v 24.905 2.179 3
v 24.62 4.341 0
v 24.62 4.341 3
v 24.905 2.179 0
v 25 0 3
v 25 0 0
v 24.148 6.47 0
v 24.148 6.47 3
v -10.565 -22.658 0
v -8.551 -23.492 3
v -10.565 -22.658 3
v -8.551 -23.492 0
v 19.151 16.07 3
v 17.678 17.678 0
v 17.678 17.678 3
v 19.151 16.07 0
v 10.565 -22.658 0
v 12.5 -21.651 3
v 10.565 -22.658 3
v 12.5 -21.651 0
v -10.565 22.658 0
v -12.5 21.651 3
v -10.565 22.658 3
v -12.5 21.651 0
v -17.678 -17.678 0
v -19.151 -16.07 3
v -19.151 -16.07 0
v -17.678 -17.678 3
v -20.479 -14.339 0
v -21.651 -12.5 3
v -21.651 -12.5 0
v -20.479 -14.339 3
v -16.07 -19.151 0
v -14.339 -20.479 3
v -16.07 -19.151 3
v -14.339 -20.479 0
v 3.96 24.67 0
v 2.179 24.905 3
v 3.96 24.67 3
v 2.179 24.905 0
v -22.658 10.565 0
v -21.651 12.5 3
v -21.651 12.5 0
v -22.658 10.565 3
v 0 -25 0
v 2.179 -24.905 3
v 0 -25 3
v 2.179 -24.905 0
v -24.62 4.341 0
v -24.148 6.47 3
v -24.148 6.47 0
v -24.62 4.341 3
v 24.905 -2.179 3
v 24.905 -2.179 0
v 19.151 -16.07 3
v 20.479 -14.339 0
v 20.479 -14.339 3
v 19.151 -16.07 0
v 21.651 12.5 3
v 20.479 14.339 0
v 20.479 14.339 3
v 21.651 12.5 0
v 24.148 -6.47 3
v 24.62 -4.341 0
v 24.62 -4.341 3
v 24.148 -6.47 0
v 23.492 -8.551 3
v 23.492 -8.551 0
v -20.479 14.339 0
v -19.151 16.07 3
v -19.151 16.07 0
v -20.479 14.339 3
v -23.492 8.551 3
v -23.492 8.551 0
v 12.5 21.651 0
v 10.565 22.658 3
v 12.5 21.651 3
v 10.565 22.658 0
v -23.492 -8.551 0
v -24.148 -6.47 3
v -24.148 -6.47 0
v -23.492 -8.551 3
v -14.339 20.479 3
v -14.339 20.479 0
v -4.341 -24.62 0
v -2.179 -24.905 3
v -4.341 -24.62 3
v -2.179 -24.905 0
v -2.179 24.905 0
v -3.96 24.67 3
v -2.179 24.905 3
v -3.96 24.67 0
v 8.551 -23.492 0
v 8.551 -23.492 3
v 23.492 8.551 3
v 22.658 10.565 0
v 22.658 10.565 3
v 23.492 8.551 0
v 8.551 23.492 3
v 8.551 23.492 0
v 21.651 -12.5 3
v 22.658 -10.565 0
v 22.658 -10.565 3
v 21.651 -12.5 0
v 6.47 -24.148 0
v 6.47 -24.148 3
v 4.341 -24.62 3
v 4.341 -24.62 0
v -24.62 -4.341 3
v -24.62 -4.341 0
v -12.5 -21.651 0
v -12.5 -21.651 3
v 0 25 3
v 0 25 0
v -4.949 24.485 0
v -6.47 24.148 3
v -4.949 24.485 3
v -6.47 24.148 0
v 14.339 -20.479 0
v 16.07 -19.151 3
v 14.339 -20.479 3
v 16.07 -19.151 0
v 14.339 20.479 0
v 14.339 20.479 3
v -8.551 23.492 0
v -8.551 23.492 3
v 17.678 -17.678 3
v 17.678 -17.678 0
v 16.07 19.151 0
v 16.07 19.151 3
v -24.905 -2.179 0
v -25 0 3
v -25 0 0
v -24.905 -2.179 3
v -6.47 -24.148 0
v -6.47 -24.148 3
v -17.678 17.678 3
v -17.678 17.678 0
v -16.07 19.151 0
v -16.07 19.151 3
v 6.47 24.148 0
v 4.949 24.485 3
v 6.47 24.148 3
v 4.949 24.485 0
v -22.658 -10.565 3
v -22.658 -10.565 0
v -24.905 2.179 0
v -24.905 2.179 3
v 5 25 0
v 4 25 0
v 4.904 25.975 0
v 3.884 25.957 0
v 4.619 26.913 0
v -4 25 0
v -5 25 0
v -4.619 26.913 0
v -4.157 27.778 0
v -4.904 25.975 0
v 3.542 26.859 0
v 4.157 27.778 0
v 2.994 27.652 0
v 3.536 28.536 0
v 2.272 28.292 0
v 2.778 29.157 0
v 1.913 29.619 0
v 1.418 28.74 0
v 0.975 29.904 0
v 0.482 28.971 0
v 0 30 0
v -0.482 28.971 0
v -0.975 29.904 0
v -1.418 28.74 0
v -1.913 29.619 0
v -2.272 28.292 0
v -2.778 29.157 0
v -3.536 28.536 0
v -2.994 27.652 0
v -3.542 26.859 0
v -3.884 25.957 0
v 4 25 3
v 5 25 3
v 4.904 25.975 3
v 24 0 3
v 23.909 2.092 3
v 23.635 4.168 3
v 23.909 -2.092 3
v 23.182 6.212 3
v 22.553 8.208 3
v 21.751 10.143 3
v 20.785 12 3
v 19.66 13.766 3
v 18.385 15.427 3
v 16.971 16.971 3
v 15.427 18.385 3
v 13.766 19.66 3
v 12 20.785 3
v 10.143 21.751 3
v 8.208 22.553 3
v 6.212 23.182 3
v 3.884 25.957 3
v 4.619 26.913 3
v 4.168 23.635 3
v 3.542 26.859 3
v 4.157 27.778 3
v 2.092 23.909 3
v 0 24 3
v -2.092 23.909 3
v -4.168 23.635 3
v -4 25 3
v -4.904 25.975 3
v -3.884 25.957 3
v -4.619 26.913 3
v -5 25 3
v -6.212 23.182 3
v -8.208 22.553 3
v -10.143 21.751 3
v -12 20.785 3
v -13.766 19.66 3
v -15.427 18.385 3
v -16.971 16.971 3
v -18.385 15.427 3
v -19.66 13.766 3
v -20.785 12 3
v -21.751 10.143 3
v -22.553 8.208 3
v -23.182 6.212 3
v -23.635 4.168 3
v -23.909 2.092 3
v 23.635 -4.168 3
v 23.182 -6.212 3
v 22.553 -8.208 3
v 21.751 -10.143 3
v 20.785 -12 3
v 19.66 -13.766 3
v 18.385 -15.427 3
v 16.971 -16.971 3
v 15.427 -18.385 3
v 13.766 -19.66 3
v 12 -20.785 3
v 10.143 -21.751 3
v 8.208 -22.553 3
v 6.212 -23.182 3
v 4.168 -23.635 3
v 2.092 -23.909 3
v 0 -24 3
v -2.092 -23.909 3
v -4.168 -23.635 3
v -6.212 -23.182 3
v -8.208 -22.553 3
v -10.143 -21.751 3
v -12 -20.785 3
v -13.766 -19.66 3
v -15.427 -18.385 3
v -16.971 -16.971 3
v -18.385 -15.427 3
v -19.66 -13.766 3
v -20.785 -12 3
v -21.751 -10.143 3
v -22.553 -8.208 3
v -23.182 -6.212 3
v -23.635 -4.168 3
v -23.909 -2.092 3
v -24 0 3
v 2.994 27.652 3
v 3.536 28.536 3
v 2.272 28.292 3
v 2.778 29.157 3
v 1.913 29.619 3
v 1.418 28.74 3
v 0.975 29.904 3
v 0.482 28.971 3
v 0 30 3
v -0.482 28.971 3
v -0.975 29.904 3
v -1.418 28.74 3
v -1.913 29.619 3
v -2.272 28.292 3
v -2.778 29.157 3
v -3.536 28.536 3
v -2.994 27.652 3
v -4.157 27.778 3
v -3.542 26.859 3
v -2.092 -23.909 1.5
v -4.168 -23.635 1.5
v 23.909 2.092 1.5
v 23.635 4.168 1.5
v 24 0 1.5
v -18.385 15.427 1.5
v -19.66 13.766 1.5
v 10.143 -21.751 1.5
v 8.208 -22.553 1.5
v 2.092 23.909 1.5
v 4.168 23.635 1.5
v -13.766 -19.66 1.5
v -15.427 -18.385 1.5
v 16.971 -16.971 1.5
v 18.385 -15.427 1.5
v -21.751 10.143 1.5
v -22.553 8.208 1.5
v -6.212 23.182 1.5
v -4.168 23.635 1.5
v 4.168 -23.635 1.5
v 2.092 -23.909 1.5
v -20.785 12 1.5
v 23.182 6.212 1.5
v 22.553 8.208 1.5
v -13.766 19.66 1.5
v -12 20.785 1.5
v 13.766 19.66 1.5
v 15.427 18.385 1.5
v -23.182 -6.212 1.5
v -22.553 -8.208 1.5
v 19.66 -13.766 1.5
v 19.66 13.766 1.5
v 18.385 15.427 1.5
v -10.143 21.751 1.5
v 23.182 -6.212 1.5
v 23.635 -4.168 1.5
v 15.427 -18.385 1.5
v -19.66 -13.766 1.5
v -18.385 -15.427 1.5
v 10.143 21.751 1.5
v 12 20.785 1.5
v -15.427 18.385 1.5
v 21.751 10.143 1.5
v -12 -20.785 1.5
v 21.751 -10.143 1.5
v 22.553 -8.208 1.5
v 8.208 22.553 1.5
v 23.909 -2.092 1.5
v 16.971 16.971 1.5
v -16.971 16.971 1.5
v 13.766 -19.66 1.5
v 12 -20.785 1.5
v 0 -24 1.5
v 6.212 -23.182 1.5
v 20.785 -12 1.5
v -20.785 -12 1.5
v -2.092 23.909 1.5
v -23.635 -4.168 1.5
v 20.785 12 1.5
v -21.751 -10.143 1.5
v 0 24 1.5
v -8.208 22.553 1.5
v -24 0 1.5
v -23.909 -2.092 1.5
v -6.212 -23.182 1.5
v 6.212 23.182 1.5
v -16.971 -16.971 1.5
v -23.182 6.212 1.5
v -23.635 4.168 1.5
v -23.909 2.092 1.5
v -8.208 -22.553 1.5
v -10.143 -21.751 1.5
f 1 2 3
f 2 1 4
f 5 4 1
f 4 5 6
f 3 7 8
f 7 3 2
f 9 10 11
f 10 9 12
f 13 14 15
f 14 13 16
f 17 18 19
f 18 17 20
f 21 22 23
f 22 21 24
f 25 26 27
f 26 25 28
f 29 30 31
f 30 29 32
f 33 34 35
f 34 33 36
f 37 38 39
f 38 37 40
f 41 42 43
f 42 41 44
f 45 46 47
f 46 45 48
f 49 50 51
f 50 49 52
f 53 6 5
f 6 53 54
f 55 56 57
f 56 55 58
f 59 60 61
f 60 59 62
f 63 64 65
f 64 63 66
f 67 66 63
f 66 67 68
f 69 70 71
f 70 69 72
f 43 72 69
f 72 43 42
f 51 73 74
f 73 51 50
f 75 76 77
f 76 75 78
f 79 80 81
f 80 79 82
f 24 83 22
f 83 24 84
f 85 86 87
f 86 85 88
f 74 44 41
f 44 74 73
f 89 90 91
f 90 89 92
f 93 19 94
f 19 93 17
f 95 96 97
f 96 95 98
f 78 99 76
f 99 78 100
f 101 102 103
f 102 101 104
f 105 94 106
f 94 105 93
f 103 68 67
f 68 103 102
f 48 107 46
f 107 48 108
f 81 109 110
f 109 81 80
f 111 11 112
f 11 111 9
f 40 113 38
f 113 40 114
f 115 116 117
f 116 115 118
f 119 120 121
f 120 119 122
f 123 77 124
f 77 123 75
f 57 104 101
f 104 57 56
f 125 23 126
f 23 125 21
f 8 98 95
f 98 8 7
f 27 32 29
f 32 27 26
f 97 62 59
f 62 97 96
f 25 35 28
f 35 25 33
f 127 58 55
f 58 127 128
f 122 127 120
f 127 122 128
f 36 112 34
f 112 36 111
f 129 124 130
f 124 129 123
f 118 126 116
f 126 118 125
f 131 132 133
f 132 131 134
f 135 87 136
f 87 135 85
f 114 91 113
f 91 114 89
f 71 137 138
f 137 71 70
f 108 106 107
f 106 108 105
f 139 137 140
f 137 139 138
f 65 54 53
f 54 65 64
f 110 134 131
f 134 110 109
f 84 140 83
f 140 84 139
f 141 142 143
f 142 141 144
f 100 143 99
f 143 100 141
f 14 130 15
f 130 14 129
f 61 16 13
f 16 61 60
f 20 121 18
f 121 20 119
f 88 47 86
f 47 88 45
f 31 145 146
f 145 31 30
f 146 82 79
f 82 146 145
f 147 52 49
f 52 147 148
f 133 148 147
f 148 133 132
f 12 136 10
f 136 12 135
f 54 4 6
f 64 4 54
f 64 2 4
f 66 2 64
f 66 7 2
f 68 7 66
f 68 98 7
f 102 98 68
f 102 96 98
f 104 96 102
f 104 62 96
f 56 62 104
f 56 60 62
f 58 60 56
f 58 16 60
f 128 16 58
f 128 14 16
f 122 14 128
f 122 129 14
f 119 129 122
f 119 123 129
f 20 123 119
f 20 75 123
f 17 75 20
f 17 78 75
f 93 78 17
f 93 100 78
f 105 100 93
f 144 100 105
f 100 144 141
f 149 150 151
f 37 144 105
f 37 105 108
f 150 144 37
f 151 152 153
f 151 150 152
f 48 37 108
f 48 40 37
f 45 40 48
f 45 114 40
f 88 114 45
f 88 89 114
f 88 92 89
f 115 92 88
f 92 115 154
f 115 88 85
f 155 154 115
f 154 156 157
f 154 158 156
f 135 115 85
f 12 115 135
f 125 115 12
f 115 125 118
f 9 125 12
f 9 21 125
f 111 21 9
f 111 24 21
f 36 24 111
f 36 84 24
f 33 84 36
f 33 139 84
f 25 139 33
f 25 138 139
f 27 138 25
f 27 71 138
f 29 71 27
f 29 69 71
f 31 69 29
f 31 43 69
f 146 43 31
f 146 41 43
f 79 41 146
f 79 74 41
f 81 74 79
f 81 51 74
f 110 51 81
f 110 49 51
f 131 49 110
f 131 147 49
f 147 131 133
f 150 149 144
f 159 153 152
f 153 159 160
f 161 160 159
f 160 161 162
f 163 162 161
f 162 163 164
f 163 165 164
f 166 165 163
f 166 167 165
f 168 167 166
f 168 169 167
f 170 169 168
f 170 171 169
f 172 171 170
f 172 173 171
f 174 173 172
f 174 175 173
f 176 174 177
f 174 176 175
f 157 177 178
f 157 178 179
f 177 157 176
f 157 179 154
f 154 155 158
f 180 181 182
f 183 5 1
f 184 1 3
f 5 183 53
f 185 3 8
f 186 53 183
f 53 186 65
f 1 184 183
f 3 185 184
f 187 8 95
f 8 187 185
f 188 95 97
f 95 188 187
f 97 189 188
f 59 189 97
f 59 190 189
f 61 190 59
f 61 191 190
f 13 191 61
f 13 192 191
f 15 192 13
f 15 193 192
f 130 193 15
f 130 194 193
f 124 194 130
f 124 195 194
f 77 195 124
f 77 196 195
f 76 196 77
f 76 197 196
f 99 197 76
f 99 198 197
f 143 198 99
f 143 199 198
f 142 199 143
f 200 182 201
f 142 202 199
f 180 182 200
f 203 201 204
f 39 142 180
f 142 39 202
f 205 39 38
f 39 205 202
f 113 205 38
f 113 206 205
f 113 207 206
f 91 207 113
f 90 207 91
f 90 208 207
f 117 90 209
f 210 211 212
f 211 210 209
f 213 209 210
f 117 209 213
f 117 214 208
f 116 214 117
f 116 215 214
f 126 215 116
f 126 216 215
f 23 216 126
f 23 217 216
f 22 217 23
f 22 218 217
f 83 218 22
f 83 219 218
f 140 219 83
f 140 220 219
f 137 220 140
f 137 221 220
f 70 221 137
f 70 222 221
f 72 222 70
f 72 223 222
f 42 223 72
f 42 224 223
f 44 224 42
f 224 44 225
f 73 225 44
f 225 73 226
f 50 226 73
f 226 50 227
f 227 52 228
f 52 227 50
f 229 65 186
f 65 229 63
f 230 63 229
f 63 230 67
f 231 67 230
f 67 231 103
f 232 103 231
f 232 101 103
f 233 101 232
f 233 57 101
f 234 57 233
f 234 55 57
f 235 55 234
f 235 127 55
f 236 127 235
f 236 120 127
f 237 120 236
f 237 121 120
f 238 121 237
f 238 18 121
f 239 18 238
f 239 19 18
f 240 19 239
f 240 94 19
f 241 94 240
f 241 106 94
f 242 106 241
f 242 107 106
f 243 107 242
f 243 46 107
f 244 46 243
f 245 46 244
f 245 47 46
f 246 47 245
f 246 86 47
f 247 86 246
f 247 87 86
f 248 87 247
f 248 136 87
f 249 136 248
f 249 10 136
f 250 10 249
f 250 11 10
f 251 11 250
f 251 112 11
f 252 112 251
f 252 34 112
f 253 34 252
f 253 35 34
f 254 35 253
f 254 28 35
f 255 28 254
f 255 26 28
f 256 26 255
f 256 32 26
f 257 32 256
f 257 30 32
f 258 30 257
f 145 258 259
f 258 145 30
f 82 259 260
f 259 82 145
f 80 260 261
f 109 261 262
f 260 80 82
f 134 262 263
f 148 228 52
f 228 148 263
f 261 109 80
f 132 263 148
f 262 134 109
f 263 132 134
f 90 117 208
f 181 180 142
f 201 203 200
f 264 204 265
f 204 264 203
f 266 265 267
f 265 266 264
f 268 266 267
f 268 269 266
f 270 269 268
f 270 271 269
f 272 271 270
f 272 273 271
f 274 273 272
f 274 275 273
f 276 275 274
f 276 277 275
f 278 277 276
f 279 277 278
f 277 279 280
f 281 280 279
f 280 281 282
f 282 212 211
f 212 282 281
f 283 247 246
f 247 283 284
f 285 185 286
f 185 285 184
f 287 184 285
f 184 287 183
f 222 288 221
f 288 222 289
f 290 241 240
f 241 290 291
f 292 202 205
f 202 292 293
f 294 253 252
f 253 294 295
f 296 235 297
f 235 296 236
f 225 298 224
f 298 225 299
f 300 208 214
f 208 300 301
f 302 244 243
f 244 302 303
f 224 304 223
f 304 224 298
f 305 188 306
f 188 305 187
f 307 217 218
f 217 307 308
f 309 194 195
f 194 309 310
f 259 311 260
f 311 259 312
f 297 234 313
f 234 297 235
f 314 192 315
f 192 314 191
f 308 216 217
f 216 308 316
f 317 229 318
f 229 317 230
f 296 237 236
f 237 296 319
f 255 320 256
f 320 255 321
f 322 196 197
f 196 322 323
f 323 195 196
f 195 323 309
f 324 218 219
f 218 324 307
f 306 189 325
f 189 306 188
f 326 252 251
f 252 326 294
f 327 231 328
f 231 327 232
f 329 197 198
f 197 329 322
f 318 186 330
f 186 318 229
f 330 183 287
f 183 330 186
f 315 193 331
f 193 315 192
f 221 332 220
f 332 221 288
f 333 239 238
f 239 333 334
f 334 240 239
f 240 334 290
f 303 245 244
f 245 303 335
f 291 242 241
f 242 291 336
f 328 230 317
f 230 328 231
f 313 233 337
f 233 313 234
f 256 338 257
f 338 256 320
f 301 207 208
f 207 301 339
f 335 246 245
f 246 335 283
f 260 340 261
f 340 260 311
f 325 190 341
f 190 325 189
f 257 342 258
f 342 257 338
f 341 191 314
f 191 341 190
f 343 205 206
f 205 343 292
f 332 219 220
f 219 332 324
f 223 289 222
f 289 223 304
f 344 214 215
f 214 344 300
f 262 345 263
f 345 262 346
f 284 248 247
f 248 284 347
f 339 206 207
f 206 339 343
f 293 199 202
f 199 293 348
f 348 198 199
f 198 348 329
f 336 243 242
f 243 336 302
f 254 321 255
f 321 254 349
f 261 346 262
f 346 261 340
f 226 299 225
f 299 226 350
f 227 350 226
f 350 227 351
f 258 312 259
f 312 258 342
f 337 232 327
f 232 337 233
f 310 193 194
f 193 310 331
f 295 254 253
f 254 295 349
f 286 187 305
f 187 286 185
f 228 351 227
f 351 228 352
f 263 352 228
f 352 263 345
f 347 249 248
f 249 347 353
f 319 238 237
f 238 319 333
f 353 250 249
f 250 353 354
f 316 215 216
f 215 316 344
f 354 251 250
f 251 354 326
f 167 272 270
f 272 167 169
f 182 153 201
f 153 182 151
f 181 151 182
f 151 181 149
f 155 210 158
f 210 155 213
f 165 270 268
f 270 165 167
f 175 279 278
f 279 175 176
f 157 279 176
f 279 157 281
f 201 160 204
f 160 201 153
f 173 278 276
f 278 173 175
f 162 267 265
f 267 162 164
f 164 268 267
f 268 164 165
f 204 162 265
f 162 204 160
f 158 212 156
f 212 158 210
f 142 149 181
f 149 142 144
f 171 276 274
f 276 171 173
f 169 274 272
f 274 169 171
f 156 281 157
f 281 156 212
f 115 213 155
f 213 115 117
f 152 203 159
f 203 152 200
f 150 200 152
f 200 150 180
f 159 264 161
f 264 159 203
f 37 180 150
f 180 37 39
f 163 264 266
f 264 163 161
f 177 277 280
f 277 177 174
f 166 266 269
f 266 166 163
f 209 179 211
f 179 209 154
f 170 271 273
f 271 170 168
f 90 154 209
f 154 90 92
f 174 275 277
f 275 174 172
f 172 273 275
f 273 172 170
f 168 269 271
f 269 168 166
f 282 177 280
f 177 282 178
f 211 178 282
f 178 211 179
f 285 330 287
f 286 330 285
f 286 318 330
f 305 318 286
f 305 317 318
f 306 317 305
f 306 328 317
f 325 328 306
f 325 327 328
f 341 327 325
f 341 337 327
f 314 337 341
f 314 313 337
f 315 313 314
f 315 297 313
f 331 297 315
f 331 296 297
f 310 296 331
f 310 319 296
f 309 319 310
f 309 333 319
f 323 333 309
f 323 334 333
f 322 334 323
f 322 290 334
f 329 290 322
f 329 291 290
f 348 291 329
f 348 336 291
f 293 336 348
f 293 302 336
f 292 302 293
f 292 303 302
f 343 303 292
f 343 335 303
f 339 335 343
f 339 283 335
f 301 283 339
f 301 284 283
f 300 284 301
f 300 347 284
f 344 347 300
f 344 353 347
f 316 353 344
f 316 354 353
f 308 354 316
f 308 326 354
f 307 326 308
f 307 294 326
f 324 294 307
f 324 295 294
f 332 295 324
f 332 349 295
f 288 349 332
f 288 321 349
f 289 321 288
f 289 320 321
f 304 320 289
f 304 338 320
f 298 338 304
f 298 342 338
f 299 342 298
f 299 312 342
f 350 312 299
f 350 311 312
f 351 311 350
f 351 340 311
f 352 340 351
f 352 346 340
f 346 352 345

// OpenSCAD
FAST = true;
E = 0.1;
$fa = 5;

module pendant() {
  cylinder(r=50, h=2);
  translate([0, 0, 2])
    chamfer(2)
      translate([-36, -40, 0]) child(0);
  ring(50, 2, 4);
  translate([0, 50, 0])
    difference() {
      ring(10, 2, 4);
      translate([0, -12, 0])
        cube(20, center=true);
    }
}

module chamfer(height, edge=1) {
  if (!FAST) {
    minkowski() {
      linear_extrude(height=height - edge)
        child(0);
      cylinder(r1=edge, r2=0.1, h=edge, $fn=6);
    }
  } else {
    linear_extrude(height=height)
      child(0);
  }
}

// Ring around origin (at z=0)
module ring(r, thickness, height) {
  translate([0, 0, height / 2]) {
    difference() {
      cylinder(h=height, r=r, center=true);
      cylinder(h=height + 2 * E, r=r - thickness, center=true);
    }
  }
}

scale([0.5, 0.5, 3/4])
  pendant() import("chang.dxf");
